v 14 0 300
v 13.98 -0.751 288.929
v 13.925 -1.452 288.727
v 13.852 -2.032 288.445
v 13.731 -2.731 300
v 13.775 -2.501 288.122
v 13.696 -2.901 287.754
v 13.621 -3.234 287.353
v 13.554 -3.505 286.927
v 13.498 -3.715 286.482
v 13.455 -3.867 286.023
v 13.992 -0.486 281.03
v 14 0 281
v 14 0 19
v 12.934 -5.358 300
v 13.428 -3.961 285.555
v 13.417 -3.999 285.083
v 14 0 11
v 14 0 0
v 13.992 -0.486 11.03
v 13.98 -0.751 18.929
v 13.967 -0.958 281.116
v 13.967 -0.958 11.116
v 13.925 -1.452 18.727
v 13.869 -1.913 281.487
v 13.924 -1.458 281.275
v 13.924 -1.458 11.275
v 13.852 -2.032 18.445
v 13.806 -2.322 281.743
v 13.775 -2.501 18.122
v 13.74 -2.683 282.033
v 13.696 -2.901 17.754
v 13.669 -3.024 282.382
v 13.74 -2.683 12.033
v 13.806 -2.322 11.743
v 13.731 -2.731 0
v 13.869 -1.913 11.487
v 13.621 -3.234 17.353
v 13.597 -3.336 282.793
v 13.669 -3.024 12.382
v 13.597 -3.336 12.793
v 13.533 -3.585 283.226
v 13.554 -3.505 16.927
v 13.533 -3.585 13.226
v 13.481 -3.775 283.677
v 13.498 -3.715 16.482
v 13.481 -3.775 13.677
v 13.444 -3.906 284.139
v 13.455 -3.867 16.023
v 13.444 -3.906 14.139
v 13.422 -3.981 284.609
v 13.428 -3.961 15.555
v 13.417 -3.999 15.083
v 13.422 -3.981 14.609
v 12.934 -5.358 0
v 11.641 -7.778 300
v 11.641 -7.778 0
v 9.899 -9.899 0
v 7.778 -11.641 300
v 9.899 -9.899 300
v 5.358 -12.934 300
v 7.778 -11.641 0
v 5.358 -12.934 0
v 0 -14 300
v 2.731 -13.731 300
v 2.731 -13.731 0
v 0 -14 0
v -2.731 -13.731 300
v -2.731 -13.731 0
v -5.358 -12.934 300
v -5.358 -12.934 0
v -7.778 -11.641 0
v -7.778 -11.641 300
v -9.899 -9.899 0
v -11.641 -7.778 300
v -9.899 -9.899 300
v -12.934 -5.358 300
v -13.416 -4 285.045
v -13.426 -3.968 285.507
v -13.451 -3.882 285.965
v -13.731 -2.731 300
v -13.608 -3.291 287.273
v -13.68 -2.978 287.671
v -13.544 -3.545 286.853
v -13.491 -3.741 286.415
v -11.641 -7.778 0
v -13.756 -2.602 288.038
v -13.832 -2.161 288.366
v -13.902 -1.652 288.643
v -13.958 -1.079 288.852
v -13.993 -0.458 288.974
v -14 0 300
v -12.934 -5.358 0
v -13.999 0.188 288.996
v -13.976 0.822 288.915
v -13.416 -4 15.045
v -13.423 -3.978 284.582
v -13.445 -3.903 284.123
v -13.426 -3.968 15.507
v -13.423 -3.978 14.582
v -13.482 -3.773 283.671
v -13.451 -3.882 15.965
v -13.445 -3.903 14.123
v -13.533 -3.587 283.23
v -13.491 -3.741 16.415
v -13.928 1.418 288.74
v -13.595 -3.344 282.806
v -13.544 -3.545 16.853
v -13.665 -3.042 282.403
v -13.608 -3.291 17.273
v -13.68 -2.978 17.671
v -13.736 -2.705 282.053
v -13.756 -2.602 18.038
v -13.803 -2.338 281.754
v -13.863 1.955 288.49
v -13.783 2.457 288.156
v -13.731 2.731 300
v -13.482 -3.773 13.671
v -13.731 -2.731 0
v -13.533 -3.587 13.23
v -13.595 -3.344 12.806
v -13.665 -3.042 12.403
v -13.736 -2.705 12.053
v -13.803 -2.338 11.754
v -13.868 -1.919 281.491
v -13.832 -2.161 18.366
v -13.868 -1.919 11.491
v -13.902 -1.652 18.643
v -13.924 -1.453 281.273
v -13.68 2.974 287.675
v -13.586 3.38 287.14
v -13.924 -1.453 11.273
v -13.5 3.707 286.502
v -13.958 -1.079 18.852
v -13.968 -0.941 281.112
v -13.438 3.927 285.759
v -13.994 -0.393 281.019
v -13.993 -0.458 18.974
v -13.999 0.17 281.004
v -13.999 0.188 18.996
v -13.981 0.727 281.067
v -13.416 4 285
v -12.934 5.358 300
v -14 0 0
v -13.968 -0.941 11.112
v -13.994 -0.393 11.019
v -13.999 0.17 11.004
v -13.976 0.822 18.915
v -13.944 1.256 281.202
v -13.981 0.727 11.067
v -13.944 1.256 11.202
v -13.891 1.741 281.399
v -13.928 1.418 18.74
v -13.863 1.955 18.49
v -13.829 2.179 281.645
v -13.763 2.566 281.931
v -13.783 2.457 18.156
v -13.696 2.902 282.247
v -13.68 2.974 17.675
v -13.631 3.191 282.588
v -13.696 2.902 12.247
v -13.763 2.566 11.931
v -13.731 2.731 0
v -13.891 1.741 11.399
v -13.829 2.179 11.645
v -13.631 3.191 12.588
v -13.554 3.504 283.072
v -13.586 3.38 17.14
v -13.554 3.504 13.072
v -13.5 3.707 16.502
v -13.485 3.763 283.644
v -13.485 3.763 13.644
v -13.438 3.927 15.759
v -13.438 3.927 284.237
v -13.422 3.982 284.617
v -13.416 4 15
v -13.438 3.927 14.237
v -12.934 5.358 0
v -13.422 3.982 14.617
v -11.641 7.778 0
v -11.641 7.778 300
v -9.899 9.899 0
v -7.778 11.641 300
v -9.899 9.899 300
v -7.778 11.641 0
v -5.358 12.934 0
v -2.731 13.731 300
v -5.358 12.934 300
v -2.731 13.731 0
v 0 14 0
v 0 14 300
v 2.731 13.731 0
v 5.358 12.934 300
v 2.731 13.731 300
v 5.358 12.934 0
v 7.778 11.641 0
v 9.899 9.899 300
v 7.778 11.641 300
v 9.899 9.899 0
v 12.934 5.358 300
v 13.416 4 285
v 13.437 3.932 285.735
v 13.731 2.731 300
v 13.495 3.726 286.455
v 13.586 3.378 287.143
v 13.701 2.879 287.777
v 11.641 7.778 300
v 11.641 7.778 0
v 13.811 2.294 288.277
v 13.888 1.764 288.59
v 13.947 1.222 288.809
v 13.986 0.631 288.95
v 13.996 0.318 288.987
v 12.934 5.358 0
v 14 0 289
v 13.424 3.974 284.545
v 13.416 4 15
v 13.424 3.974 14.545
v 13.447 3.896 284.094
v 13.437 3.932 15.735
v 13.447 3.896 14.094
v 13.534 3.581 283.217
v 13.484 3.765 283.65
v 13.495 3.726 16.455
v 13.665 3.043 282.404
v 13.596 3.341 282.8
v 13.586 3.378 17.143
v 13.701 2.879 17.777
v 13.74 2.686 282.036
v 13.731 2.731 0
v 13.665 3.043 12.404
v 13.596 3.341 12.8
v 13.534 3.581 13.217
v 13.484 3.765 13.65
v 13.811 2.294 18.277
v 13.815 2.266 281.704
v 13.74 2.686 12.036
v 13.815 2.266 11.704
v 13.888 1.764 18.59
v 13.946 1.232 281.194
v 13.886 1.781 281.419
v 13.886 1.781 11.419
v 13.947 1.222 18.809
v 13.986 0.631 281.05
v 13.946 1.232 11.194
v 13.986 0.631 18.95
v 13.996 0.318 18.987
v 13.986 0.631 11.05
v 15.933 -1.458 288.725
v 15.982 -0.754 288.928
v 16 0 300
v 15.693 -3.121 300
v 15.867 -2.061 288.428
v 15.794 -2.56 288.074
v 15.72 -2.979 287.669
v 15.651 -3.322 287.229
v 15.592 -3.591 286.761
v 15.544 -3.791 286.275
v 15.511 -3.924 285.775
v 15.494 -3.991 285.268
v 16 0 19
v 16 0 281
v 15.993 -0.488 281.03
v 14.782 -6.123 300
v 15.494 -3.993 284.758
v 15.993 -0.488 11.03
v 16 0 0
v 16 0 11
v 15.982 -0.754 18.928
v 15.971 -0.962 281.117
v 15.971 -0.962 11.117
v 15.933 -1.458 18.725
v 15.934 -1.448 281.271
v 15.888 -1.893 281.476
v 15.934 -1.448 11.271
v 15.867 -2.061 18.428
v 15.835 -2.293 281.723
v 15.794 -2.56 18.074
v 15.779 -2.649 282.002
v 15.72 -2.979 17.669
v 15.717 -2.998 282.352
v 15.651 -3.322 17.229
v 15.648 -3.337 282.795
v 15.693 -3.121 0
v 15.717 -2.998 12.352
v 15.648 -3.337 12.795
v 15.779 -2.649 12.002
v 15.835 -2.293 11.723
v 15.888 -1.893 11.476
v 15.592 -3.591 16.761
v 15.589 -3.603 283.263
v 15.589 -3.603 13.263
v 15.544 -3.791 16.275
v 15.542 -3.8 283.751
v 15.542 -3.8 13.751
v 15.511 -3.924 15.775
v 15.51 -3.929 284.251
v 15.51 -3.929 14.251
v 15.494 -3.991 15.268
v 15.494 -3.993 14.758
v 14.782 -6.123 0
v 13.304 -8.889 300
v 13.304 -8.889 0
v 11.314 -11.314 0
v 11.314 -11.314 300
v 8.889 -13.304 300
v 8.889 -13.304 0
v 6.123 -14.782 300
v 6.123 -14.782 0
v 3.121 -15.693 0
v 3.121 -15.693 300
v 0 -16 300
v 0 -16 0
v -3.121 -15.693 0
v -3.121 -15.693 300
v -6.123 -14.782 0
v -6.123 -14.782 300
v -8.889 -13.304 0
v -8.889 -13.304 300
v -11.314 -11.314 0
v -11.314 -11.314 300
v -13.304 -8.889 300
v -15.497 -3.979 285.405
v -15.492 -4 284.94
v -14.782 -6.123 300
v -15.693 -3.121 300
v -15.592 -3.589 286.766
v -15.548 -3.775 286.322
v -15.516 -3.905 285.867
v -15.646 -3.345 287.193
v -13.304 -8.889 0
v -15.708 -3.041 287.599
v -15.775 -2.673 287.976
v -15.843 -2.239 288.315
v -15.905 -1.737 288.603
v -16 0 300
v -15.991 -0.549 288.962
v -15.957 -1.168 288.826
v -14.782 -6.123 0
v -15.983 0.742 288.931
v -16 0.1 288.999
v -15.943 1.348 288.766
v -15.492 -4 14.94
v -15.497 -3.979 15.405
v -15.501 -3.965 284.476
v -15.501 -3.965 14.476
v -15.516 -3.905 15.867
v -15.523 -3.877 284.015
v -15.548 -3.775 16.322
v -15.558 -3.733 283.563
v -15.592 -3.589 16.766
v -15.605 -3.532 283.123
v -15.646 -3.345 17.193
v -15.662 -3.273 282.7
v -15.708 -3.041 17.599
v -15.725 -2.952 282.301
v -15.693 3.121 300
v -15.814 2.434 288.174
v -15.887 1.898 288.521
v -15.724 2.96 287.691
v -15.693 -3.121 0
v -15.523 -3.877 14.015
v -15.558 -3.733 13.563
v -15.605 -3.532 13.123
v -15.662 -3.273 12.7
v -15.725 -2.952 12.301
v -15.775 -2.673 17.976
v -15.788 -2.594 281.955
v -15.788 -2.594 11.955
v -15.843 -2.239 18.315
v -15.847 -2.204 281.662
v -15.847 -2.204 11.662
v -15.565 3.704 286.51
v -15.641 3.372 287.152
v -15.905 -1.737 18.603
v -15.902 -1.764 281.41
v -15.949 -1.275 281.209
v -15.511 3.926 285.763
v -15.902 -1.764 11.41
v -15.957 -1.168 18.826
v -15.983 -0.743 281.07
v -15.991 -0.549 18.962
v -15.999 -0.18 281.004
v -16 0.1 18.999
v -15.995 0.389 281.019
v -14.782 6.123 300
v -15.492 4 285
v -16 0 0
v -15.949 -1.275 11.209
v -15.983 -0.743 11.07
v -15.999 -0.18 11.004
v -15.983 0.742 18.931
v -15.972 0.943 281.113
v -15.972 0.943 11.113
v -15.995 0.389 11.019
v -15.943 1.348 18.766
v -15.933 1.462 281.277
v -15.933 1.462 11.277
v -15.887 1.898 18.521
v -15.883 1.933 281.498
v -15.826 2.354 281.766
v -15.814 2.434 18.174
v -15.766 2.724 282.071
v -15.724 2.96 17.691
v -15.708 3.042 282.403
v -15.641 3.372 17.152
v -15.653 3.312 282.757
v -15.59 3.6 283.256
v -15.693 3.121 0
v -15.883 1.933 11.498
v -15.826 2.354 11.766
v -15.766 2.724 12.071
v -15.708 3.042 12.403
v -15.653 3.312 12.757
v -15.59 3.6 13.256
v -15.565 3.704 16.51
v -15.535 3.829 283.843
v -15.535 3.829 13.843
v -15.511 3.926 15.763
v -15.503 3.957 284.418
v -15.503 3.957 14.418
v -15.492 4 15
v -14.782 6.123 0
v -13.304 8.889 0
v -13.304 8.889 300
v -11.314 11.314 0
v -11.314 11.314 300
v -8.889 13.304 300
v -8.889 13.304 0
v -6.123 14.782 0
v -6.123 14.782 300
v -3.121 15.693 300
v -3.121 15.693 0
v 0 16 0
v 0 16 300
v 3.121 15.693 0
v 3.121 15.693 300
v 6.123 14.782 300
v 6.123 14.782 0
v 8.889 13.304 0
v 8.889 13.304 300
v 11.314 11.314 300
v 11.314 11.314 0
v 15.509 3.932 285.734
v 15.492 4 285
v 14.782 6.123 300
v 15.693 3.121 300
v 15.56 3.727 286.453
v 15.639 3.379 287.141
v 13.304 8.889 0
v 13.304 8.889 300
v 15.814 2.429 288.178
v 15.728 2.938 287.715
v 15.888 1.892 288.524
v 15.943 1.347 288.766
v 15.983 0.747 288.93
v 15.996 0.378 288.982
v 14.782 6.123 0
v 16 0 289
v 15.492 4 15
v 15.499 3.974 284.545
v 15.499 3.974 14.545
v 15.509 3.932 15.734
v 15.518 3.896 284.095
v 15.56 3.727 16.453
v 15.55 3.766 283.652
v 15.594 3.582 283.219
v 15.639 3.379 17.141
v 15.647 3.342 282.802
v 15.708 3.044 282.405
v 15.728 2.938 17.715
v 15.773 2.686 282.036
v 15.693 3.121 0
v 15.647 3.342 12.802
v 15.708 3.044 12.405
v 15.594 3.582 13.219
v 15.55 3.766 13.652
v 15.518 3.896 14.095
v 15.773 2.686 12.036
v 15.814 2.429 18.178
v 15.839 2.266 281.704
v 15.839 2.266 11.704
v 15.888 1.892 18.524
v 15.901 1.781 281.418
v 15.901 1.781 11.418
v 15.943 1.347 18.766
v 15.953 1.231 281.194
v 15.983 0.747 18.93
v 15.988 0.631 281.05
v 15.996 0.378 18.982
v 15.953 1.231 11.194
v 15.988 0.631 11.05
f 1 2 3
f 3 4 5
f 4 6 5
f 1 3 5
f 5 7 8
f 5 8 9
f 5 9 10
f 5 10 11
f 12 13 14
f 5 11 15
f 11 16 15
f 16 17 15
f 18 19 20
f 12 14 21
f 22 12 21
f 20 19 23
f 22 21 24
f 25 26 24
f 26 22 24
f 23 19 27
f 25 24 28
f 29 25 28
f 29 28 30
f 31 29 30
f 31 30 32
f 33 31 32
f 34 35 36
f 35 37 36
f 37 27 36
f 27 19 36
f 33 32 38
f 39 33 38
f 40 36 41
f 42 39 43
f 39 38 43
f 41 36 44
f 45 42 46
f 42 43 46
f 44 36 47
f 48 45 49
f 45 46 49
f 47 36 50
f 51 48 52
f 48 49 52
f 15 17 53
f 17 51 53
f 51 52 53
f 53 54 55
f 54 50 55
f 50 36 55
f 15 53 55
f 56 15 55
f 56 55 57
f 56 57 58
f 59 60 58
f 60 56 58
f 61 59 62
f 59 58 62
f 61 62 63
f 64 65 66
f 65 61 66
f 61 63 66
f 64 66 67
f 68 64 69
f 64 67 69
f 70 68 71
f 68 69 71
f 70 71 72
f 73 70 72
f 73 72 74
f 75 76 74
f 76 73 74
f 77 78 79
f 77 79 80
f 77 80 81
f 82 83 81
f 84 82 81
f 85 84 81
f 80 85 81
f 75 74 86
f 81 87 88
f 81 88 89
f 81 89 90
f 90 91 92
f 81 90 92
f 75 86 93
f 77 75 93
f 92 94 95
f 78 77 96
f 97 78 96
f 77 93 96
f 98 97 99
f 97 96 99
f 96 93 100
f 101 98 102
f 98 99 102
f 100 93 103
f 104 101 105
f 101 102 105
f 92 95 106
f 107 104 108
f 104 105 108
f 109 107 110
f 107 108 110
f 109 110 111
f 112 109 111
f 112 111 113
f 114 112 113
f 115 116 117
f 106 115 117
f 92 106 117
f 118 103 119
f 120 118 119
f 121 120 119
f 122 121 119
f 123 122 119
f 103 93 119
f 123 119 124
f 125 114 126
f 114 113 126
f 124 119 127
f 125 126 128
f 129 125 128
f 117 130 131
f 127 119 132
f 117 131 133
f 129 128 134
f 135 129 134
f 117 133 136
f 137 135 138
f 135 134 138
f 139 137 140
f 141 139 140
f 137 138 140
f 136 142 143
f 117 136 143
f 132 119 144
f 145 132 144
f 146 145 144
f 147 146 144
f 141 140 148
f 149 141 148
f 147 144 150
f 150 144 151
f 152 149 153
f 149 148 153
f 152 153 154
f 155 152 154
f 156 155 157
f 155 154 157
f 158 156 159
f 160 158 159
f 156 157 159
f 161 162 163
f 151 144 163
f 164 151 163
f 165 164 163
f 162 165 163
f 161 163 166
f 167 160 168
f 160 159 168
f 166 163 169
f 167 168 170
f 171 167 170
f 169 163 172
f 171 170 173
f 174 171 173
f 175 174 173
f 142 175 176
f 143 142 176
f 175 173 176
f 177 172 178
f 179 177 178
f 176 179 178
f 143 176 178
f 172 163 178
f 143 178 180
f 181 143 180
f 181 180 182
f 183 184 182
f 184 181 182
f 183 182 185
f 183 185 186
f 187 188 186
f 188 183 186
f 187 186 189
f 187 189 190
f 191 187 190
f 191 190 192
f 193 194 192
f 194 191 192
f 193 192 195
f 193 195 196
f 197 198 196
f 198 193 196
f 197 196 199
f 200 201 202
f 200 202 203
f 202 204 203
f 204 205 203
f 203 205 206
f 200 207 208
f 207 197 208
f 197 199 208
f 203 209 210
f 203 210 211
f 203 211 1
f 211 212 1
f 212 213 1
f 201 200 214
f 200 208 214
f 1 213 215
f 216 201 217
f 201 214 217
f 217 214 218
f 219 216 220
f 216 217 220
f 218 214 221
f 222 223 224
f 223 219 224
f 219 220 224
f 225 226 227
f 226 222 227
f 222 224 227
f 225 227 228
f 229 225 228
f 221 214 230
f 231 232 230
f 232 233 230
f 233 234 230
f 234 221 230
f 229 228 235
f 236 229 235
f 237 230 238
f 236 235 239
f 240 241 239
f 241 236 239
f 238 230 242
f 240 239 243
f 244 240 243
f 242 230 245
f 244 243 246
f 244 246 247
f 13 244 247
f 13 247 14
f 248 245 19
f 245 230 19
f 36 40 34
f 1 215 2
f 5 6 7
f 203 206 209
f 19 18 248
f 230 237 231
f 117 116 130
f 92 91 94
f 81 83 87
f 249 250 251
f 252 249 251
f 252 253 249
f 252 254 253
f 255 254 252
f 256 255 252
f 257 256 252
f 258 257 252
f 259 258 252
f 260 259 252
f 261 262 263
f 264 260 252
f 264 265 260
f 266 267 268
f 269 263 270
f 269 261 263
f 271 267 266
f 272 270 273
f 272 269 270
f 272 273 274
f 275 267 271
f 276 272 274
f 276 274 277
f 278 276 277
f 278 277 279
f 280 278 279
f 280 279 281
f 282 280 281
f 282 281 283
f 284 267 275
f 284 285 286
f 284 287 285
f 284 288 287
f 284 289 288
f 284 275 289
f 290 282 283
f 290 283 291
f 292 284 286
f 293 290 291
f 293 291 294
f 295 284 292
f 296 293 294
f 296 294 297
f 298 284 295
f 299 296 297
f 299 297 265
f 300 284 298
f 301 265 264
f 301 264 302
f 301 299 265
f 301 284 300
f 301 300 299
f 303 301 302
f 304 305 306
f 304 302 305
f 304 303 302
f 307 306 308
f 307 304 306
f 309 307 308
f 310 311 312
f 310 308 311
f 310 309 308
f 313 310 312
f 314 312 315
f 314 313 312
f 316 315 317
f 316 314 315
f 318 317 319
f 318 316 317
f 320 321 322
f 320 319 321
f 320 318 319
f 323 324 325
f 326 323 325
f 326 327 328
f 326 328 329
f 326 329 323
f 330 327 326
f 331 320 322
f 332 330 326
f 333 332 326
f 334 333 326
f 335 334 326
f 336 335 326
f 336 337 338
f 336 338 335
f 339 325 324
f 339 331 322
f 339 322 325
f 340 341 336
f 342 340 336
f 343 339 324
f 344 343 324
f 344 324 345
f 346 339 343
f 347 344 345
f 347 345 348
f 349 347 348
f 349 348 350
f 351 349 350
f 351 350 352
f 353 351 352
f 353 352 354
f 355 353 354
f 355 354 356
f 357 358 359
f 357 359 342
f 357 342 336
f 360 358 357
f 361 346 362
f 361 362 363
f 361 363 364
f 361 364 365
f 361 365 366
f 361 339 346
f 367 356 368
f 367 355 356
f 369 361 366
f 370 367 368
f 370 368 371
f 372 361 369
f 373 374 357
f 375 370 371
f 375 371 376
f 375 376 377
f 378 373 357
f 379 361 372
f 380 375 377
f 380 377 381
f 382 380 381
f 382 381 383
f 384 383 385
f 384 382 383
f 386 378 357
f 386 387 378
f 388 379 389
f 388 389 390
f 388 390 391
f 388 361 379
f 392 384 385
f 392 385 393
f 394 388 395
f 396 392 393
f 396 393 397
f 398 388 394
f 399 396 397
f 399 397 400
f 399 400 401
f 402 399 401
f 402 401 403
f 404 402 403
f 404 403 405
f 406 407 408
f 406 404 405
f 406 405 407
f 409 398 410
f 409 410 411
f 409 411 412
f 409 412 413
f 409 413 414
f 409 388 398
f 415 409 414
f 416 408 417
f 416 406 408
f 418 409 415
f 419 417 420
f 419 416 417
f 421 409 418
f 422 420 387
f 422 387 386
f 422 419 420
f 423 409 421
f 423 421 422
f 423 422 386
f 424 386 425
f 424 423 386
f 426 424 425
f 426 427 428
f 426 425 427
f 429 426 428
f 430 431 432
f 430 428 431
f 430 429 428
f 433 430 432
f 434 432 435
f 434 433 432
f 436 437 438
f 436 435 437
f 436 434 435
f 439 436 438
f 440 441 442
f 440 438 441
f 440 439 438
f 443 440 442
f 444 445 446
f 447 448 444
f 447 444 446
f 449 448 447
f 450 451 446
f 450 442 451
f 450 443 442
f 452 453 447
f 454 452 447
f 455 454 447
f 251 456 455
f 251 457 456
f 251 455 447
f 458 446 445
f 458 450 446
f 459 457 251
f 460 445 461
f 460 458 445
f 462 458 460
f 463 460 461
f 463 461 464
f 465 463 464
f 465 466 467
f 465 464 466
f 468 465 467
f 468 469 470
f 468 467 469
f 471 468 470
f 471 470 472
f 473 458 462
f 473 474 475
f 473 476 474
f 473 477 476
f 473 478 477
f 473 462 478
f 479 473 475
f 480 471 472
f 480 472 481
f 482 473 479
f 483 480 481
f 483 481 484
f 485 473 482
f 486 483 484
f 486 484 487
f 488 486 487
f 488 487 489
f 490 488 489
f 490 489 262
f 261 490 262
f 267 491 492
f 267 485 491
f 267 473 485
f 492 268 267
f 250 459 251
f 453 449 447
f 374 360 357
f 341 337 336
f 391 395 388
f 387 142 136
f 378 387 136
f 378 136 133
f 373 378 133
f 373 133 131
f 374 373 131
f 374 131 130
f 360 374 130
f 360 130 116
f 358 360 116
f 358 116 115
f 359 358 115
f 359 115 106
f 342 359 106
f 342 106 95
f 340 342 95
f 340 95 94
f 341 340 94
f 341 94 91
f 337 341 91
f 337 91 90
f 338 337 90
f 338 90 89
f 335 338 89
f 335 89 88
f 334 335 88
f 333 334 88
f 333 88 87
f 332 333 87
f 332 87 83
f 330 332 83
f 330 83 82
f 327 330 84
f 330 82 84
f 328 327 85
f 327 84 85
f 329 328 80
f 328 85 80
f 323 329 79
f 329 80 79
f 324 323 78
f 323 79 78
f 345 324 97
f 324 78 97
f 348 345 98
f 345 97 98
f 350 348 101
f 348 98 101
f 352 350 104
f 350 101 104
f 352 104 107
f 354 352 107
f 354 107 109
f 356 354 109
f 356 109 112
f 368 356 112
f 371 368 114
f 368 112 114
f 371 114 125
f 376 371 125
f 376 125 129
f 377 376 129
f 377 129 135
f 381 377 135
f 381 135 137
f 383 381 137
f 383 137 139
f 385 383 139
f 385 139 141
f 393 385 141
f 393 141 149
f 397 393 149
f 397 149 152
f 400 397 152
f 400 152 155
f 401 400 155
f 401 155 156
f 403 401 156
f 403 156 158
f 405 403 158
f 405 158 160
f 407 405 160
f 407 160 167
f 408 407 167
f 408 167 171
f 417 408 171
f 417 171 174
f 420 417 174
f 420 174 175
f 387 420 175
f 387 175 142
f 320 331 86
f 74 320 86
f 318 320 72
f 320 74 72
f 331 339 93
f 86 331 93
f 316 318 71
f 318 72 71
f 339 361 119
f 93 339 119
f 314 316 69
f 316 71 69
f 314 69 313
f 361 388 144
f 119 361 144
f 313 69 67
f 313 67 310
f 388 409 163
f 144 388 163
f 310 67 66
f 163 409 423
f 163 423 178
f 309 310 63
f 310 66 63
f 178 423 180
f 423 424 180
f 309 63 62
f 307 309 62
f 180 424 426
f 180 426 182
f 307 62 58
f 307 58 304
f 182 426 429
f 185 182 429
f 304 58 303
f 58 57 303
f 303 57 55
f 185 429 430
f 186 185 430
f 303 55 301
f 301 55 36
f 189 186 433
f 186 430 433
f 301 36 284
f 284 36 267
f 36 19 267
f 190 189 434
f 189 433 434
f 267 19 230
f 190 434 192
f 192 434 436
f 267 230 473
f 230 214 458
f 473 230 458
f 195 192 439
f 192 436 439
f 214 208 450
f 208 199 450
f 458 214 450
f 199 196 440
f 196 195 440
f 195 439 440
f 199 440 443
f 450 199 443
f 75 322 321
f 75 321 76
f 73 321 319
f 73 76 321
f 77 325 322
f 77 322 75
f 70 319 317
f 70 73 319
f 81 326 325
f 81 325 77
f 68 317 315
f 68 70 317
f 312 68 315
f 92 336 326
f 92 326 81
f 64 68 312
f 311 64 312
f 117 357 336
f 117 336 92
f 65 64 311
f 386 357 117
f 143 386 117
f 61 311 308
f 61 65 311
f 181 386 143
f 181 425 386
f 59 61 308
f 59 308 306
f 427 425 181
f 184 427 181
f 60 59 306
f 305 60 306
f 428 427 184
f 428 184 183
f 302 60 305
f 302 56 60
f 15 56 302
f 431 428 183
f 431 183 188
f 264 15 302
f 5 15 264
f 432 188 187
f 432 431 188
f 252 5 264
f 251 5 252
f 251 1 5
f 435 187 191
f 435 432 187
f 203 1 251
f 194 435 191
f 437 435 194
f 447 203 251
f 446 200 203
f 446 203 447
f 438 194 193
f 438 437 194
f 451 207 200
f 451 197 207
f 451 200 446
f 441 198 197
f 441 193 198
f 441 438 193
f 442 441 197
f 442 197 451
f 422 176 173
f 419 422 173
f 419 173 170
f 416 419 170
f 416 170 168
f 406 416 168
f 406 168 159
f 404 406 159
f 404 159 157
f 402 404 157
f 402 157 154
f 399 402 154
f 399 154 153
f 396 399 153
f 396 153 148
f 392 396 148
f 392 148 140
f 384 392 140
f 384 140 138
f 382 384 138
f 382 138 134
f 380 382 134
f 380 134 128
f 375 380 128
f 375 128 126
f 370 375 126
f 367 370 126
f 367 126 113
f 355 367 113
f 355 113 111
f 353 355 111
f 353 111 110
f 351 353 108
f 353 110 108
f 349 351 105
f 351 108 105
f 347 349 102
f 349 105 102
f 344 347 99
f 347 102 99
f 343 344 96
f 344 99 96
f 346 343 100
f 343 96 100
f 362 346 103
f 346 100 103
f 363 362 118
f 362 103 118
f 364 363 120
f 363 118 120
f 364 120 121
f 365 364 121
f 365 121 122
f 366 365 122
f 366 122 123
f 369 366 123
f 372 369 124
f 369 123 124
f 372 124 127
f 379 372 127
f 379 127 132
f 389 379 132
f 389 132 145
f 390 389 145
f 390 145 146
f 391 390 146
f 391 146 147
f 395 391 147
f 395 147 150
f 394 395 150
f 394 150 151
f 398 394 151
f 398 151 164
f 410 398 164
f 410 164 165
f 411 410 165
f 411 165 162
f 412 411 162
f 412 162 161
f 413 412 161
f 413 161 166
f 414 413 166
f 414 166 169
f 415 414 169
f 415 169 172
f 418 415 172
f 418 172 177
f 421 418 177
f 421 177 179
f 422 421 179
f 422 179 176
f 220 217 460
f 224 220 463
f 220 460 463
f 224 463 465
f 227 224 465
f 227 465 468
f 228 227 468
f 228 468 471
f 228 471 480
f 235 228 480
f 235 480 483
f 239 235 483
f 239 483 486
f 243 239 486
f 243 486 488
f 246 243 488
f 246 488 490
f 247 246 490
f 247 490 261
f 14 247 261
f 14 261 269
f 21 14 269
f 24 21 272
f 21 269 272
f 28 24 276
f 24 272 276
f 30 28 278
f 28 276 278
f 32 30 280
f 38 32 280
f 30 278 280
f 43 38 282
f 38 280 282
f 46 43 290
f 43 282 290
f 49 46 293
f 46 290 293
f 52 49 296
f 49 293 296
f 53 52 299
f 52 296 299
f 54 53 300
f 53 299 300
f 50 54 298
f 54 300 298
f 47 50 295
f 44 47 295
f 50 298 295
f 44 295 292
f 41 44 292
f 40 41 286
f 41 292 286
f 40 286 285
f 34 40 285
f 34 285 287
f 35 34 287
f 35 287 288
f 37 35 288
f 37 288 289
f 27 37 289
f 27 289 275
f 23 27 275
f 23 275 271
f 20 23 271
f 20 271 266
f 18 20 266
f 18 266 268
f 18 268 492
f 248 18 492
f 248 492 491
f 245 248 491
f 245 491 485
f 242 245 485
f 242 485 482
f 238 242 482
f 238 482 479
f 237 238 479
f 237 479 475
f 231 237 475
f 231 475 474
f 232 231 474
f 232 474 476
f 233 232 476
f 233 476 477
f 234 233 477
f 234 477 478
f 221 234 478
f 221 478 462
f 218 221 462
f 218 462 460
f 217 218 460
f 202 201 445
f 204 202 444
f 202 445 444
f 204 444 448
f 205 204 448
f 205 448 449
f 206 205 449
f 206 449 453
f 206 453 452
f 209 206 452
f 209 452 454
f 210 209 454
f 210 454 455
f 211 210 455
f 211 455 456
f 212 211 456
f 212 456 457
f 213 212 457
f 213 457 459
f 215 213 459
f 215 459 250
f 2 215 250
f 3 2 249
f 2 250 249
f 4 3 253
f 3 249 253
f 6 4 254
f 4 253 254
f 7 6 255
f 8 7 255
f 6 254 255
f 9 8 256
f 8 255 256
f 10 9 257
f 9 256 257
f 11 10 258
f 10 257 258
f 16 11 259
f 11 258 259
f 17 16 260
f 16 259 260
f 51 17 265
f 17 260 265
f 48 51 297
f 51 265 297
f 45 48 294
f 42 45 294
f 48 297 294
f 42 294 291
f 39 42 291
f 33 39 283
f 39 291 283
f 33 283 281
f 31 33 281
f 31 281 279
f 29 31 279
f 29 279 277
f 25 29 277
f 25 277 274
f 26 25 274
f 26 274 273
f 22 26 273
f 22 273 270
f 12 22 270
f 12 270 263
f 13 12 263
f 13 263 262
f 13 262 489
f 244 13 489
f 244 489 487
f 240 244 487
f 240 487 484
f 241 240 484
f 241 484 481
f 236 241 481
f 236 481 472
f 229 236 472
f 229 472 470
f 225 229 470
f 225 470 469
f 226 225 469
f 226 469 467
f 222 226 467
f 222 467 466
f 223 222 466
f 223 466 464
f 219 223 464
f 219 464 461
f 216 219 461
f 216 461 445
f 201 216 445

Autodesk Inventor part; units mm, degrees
ref_plane "XZ Plane" through (0, 0, 0) normal (0, 1, 0) x (-1, 0, 0)
ref_plane "XY Plane" through (0, 0, 0) normal (0, 0, 1) x (1, 0, 0)
sketch "Sketch1" plane through (0, 0, 0) normal (0, 0, 1) x (1, 0, 0)
  circle A0 centre (0, 0) radius 16
  circle A1 centre (0, 0) radius 14
  dimension "d0" = 32
  dimension "d3" = 28
extrude "Extrusion1" add sketch "Sketch1" along normal blind 300
ref_plane "Work Plane1" through (16, 0, 0) normal (1, 0, 0) x (0, 1, 0)
sketch "Sketch2" plane through (16, 0, 0) normal (1, 0, 0) x (0, 1, 0)
  circle A0 centre (0, 15) radius 4
  line L0 (0, -97.8) -> (0, 586.8) projected
  line L1 (16, 0) -> (-16, 0) projected
  circle A1 centre (0, 285) radius 4
  line L2 (16, 300) -> (-16, 300) projected
  point P0 (0, 0)
  dimension "d4" = 8
  dimension "d5" = 15
  dimension "d6" = 8
  dimension "d7" = 15
extrude "Extrusion2" cut sketch "Sketch2" against normal through all
properties part number "Steering PVC" material "PVC-Piping"
